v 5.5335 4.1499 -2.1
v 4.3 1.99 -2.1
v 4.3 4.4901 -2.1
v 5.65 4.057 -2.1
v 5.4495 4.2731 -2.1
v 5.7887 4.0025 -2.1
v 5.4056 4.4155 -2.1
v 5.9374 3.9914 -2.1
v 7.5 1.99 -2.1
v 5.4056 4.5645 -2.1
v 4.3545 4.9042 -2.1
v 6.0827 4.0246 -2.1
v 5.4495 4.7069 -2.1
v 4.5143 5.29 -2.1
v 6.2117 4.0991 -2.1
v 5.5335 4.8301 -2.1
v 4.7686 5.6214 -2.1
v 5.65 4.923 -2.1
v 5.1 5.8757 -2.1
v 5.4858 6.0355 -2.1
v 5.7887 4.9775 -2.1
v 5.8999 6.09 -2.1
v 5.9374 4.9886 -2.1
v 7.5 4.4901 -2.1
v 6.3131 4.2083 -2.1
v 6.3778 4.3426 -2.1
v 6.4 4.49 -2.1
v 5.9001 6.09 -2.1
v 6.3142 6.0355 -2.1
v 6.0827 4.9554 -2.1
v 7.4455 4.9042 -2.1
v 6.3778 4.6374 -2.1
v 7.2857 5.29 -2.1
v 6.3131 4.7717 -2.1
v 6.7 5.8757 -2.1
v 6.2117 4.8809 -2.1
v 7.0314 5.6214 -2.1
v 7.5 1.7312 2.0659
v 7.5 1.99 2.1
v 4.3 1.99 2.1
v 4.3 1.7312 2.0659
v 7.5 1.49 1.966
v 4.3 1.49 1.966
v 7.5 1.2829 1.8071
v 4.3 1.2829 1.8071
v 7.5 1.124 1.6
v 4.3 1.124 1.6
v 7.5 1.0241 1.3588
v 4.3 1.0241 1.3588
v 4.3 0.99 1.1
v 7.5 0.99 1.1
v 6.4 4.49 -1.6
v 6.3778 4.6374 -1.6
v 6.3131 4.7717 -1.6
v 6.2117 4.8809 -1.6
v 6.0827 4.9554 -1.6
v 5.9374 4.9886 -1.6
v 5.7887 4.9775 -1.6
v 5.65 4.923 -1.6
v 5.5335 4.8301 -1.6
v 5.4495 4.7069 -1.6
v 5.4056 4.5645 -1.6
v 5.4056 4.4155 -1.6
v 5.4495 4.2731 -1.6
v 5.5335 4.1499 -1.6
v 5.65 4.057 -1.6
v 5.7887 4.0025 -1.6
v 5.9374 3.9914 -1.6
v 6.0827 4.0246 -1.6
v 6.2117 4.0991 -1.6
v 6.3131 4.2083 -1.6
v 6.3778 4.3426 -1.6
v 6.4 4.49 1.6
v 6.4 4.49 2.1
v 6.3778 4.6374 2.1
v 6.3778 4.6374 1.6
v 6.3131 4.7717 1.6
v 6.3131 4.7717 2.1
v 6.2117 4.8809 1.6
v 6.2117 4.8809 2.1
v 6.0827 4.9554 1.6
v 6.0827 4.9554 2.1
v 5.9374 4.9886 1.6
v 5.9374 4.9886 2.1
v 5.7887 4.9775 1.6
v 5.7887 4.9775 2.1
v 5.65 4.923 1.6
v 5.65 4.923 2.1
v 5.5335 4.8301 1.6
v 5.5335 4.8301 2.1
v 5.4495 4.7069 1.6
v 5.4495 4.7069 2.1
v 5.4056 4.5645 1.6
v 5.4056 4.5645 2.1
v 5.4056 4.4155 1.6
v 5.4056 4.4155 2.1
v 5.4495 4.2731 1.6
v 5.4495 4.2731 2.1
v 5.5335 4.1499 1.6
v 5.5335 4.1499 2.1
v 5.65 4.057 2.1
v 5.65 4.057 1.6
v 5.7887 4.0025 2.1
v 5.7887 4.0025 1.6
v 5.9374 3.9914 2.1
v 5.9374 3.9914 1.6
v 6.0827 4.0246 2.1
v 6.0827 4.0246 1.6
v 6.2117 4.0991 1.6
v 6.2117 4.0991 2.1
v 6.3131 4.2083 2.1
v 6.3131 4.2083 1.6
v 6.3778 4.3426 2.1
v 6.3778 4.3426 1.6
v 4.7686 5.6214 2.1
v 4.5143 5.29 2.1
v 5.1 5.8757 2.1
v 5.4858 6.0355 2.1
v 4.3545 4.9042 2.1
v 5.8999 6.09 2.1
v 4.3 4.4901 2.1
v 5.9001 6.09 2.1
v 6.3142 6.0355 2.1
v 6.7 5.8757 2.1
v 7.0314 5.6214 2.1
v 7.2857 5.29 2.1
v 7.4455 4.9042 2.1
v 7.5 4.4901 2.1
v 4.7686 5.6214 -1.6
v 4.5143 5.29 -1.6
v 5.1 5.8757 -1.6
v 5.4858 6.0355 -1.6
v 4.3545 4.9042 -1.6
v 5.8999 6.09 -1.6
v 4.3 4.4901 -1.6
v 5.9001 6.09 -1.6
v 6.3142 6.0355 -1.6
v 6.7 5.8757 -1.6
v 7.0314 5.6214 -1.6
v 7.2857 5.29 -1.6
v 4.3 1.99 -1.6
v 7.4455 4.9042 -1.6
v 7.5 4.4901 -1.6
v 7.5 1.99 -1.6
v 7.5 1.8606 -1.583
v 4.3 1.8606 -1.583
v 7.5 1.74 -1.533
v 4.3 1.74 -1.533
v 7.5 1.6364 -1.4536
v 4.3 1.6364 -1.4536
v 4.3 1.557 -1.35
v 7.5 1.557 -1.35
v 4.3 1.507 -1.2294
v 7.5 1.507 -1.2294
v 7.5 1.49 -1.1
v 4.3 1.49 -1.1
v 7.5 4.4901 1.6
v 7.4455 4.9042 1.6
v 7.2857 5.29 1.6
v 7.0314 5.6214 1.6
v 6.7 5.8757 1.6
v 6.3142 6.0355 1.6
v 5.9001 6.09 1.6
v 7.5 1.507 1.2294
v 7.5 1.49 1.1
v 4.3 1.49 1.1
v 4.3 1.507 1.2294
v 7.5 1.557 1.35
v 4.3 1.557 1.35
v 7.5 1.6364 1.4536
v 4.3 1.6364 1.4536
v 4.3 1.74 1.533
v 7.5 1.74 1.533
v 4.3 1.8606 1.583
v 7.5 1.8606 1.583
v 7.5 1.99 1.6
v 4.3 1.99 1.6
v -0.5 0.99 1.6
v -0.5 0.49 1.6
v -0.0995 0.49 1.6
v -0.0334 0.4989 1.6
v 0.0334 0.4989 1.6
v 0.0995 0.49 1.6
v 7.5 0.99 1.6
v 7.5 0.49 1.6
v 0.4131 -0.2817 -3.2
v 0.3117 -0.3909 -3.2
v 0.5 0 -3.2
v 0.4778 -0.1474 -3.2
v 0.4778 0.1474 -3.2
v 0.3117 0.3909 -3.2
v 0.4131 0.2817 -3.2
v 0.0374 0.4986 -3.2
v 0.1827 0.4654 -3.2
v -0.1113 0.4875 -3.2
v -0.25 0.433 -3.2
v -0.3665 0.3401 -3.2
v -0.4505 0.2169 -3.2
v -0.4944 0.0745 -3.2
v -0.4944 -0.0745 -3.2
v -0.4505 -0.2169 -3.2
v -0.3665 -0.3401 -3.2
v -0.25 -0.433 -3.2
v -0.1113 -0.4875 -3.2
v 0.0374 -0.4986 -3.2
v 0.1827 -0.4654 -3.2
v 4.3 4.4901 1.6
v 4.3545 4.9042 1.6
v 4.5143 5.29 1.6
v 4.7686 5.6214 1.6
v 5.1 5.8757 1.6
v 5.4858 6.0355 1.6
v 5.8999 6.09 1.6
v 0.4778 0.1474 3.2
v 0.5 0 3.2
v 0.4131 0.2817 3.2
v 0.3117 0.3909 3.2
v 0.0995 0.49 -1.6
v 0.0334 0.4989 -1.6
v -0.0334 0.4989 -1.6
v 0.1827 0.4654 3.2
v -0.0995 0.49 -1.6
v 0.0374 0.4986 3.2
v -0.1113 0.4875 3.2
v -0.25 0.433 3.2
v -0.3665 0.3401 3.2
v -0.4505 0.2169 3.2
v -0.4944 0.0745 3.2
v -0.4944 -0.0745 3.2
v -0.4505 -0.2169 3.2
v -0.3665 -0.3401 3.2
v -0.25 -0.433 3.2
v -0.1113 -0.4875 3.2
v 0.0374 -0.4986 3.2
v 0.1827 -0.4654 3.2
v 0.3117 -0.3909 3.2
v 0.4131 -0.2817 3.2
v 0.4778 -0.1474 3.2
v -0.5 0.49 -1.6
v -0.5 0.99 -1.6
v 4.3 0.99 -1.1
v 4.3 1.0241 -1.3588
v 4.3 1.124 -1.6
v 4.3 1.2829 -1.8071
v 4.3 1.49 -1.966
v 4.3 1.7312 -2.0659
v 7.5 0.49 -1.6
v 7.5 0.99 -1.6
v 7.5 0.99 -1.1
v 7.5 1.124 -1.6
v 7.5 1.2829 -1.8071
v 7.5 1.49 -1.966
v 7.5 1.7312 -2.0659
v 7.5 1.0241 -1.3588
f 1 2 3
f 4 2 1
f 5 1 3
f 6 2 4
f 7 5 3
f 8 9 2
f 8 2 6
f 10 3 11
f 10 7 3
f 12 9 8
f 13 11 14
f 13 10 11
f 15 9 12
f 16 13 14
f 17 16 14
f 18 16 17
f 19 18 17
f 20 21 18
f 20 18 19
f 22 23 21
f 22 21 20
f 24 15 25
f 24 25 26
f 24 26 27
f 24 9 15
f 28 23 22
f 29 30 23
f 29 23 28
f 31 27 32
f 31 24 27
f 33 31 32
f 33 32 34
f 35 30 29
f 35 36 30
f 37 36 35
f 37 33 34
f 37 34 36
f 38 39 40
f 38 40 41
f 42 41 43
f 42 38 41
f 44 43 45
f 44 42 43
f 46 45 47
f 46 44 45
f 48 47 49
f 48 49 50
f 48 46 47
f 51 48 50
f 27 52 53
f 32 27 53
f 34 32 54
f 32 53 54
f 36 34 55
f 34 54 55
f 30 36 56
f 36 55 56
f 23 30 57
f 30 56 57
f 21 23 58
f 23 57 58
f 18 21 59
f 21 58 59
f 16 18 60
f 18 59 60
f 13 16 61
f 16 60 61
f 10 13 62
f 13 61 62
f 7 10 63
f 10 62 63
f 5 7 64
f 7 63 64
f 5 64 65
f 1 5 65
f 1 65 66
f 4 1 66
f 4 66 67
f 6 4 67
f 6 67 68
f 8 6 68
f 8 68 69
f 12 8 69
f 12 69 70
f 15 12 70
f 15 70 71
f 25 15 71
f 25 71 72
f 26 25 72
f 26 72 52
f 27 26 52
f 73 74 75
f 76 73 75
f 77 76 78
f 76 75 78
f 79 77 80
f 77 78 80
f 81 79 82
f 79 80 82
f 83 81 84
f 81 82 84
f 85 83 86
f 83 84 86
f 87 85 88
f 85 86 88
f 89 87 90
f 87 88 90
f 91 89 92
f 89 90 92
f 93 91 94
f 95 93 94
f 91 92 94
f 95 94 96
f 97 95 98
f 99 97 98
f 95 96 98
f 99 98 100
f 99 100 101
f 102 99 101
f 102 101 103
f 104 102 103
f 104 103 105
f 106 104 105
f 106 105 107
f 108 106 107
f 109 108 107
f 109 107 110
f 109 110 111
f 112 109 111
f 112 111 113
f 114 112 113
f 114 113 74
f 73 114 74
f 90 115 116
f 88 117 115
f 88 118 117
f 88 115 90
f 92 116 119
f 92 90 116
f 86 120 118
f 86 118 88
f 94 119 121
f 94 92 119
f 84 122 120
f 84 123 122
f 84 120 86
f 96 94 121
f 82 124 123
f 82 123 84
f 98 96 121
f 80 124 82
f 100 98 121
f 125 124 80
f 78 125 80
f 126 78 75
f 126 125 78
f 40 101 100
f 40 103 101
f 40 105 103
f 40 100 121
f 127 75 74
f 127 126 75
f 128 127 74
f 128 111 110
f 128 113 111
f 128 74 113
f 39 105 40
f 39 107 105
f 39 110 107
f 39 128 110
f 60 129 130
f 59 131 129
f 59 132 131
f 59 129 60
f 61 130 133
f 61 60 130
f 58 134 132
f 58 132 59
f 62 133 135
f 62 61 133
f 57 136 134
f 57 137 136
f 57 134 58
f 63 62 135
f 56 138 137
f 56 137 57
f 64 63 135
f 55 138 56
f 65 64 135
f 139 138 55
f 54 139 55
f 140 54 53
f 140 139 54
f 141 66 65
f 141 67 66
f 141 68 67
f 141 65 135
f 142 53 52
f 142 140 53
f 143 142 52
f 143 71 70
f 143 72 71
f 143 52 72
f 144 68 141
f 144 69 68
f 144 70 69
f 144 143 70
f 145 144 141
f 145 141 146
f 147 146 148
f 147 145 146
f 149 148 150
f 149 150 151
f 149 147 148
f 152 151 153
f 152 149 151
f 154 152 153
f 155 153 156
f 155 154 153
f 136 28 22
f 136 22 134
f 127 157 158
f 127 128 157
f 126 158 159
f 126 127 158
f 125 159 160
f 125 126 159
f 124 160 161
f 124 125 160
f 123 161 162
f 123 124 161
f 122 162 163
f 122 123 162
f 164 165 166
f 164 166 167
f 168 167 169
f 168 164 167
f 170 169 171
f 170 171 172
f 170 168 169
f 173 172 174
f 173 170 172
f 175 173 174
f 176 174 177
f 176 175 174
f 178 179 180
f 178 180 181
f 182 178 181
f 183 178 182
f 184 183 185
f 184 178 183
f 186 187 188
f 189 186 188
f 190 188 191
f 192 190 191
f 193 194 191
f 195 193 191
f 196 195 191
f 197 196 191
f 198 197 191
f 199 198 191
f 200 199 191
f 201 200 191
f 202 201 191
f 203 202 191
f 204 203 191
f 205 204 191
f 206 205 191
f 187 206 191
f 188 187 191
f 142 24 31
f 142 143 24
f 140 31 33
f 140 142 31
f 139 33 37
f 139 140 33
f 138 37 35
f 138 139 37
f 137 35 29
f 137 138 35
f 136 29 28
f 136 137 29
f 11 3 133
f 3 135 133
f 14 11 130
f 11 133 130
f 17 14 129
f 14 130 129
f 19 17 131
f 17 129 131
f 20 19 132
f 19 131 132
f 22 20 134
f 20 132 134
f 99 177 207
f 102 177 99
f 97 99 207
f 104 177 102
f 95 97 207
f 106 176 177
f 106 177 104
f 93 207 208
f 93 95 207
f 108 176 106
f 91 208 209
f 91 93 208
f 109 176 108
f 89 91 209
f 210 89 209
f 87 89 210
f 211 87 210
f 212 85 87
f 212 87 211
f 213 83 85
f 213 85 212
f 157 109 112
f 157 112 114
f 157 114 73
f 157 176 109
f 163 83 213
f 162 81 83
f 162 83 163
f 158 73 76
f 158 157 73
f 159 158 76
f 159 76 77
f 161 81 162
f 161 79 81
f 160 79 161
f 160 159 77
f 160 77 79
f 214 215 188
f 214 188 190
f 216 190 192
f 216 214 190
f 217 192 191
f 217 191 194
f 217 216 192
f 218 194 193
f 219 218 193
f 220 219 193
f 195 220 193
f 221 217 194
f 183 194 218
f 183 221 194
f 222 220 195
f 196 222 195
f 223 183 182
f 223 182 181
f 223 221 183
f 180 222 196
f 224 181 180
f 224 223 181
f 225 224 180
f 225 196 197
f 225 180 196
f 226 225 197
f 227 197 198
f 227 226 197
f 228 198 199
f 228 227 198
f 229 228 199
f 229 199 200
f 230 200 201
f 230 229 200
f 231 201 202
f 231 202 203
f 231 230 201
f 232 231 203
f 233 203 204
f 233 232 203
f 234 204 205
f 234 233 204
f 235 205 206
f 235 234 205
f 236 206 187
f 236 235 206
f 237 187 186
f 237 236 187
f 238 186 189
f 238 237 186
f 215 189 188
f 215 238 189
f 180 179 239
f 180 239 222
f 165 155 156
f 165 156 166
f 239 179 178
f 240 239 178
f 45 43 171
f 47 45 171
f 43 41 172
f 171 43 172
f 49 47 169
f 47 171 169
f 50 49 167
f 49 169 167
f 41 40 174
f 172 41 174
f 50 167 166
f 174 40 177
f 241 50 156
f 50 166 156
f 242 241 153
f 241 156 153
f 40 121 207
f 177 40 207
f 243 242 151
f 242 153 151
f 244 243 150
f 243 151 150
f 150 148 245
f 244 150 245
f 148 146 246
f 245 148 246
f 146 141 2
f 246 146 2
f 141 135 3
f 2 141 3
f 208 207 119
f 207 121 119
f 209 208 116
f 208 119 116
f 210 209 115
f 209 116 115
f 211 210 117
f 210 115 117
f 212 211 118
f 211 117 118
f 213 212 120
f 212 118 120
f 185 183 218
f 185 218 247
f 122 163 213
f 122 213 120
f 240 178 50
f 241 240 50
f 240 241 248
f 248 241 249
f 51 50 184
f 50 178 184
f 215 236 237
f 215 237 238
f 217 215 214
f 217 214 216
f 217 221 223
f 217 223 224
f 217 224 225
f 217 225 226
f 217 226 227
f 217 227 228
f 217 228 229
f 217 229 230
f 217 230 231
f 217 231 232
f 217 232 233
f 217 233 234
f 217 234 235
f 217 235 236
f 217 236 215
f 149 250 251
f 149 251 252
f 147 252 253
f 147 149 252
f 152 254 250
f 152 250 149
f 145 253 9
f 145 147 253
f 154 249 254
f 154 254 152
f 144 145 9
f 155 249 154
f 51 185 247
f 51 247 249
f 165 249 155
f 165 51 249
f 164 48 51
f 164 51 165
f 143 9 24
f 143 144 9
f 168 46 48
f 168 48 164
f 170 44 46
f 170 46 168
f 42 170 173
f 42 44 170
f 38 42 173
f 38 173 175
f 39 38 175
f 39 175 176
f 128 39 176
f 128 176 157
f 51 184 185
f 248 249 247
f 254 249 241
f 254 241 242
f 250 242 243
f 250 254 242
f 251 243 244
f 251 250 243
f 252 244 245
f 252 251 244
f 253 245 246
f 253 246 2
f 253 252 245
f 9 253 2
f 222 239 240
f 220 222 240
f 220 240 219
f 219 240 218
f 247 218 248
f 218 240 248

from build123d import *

# Parameters (mm, degrees)
ESQUISSE1_R             = 0.5
BASE_EXTRUSION_DEPTH    = 3.2
ESQUISSE2_W             = 8
ESQUISSE2_H             = 0.5
BOSS_EXTRU_3_DEPTH      = 1.6
BOSS_EXTRU_MINCE1_DEPTH = 3.2
ESQUISSE4_R             = 0.5
ENL_V_MAT_EXTRU_1_DEPTH = 12.01944191
CONG_1_R                = 1.6


with BuildPart() as part:
    # Esquisse1 → Base-Extrusion (new, symmetric)
    with BuildSketch(Plane.XY):
        Circle(ESQUISSE1_R)
    extrude(amount=BASE_EXTRUSION_DEPTH, both=True)

    # Esquisse2 → Boss.-Extru.3 (add, symmetric)
    with BuildSketch(Plane.XY):
        with Locations((3.5, 0.74)):
            Rectangle(ESQUISSE2_W, ESQUISSE2_H)
    extrude(amount=BOSS_EXTRU_3_DEPTH, both=True)

    # Esquisse3 → Boss.-Extru.-Mince1 (add)
    with BuildSketch(Plane(origin=(7.5, 0, 0), x_dir=(0, 0, -1), z_dir=(1, 0, 0))):
        with BuildLine():
            Line((-2.1, 6.09), (-2.1, 1.99))
            ThreePointArc((-2.1, 1.99), (-1.807106781, 1.282893219), (-1.1, 0.99))
            Line((-1.1, 0.99), (1.1, 0.99))
            ThreePointArc((1.1, 0.99), (1.807106781, 1.282893219), (2.1, 1.99))
            Line((2.1, 1.99), (2.1, 6.09))
            Line((2.1, 6.09), (1.6, 6.09))
            Line((1.6, 6.09), (1.6, 1.99))
            ThreePointArc((1.6, 1.99), (1.453553391, 1.636446609), (1.1, 1.49))
            Line((1.1, 1.49), (-1.1, 1.49))
            ThreePointArc((-1.1, 1.49), (-1.453553391, 1.636446609), (-1.6, 1.99))
            Line((-1.6, 1.99), (-1.6, 6.09))
            Line((-1.6, 6.09), (-2.1, 6.09))
        make_face()
    extrude(amount=-BOSS_EXTRU_MINCE1_DEPTH)

    # Esquisse4 → Enlèv. mat.-Extru.1 (cut, through all)
    with BuildSketch(Plane.XY.offset(2.1)):
        with Locations((5.9, 4.49)):
            Circle(ESQUISSE4_R)
    extrude(amount=-ENL_V_MAT_EXTRU_1_DEPTH, mode=Mode.SUBTRACT)

    # Congé1
    cong_1_edges = [part.edges().sort_by_distance(p)[0] for p in [
        (7.5, 6.09, 1.85),
        (7.5, 6.09, -1.85),
        (4.3, 6.09, 1.85),
        (4.3, 6.09, -1.85),
    ]]
    fillet(cong_1_edges, radius=CONG_1_R - 0.0001)  # a hair under: the kernel refuses the full size


solid = part.part
